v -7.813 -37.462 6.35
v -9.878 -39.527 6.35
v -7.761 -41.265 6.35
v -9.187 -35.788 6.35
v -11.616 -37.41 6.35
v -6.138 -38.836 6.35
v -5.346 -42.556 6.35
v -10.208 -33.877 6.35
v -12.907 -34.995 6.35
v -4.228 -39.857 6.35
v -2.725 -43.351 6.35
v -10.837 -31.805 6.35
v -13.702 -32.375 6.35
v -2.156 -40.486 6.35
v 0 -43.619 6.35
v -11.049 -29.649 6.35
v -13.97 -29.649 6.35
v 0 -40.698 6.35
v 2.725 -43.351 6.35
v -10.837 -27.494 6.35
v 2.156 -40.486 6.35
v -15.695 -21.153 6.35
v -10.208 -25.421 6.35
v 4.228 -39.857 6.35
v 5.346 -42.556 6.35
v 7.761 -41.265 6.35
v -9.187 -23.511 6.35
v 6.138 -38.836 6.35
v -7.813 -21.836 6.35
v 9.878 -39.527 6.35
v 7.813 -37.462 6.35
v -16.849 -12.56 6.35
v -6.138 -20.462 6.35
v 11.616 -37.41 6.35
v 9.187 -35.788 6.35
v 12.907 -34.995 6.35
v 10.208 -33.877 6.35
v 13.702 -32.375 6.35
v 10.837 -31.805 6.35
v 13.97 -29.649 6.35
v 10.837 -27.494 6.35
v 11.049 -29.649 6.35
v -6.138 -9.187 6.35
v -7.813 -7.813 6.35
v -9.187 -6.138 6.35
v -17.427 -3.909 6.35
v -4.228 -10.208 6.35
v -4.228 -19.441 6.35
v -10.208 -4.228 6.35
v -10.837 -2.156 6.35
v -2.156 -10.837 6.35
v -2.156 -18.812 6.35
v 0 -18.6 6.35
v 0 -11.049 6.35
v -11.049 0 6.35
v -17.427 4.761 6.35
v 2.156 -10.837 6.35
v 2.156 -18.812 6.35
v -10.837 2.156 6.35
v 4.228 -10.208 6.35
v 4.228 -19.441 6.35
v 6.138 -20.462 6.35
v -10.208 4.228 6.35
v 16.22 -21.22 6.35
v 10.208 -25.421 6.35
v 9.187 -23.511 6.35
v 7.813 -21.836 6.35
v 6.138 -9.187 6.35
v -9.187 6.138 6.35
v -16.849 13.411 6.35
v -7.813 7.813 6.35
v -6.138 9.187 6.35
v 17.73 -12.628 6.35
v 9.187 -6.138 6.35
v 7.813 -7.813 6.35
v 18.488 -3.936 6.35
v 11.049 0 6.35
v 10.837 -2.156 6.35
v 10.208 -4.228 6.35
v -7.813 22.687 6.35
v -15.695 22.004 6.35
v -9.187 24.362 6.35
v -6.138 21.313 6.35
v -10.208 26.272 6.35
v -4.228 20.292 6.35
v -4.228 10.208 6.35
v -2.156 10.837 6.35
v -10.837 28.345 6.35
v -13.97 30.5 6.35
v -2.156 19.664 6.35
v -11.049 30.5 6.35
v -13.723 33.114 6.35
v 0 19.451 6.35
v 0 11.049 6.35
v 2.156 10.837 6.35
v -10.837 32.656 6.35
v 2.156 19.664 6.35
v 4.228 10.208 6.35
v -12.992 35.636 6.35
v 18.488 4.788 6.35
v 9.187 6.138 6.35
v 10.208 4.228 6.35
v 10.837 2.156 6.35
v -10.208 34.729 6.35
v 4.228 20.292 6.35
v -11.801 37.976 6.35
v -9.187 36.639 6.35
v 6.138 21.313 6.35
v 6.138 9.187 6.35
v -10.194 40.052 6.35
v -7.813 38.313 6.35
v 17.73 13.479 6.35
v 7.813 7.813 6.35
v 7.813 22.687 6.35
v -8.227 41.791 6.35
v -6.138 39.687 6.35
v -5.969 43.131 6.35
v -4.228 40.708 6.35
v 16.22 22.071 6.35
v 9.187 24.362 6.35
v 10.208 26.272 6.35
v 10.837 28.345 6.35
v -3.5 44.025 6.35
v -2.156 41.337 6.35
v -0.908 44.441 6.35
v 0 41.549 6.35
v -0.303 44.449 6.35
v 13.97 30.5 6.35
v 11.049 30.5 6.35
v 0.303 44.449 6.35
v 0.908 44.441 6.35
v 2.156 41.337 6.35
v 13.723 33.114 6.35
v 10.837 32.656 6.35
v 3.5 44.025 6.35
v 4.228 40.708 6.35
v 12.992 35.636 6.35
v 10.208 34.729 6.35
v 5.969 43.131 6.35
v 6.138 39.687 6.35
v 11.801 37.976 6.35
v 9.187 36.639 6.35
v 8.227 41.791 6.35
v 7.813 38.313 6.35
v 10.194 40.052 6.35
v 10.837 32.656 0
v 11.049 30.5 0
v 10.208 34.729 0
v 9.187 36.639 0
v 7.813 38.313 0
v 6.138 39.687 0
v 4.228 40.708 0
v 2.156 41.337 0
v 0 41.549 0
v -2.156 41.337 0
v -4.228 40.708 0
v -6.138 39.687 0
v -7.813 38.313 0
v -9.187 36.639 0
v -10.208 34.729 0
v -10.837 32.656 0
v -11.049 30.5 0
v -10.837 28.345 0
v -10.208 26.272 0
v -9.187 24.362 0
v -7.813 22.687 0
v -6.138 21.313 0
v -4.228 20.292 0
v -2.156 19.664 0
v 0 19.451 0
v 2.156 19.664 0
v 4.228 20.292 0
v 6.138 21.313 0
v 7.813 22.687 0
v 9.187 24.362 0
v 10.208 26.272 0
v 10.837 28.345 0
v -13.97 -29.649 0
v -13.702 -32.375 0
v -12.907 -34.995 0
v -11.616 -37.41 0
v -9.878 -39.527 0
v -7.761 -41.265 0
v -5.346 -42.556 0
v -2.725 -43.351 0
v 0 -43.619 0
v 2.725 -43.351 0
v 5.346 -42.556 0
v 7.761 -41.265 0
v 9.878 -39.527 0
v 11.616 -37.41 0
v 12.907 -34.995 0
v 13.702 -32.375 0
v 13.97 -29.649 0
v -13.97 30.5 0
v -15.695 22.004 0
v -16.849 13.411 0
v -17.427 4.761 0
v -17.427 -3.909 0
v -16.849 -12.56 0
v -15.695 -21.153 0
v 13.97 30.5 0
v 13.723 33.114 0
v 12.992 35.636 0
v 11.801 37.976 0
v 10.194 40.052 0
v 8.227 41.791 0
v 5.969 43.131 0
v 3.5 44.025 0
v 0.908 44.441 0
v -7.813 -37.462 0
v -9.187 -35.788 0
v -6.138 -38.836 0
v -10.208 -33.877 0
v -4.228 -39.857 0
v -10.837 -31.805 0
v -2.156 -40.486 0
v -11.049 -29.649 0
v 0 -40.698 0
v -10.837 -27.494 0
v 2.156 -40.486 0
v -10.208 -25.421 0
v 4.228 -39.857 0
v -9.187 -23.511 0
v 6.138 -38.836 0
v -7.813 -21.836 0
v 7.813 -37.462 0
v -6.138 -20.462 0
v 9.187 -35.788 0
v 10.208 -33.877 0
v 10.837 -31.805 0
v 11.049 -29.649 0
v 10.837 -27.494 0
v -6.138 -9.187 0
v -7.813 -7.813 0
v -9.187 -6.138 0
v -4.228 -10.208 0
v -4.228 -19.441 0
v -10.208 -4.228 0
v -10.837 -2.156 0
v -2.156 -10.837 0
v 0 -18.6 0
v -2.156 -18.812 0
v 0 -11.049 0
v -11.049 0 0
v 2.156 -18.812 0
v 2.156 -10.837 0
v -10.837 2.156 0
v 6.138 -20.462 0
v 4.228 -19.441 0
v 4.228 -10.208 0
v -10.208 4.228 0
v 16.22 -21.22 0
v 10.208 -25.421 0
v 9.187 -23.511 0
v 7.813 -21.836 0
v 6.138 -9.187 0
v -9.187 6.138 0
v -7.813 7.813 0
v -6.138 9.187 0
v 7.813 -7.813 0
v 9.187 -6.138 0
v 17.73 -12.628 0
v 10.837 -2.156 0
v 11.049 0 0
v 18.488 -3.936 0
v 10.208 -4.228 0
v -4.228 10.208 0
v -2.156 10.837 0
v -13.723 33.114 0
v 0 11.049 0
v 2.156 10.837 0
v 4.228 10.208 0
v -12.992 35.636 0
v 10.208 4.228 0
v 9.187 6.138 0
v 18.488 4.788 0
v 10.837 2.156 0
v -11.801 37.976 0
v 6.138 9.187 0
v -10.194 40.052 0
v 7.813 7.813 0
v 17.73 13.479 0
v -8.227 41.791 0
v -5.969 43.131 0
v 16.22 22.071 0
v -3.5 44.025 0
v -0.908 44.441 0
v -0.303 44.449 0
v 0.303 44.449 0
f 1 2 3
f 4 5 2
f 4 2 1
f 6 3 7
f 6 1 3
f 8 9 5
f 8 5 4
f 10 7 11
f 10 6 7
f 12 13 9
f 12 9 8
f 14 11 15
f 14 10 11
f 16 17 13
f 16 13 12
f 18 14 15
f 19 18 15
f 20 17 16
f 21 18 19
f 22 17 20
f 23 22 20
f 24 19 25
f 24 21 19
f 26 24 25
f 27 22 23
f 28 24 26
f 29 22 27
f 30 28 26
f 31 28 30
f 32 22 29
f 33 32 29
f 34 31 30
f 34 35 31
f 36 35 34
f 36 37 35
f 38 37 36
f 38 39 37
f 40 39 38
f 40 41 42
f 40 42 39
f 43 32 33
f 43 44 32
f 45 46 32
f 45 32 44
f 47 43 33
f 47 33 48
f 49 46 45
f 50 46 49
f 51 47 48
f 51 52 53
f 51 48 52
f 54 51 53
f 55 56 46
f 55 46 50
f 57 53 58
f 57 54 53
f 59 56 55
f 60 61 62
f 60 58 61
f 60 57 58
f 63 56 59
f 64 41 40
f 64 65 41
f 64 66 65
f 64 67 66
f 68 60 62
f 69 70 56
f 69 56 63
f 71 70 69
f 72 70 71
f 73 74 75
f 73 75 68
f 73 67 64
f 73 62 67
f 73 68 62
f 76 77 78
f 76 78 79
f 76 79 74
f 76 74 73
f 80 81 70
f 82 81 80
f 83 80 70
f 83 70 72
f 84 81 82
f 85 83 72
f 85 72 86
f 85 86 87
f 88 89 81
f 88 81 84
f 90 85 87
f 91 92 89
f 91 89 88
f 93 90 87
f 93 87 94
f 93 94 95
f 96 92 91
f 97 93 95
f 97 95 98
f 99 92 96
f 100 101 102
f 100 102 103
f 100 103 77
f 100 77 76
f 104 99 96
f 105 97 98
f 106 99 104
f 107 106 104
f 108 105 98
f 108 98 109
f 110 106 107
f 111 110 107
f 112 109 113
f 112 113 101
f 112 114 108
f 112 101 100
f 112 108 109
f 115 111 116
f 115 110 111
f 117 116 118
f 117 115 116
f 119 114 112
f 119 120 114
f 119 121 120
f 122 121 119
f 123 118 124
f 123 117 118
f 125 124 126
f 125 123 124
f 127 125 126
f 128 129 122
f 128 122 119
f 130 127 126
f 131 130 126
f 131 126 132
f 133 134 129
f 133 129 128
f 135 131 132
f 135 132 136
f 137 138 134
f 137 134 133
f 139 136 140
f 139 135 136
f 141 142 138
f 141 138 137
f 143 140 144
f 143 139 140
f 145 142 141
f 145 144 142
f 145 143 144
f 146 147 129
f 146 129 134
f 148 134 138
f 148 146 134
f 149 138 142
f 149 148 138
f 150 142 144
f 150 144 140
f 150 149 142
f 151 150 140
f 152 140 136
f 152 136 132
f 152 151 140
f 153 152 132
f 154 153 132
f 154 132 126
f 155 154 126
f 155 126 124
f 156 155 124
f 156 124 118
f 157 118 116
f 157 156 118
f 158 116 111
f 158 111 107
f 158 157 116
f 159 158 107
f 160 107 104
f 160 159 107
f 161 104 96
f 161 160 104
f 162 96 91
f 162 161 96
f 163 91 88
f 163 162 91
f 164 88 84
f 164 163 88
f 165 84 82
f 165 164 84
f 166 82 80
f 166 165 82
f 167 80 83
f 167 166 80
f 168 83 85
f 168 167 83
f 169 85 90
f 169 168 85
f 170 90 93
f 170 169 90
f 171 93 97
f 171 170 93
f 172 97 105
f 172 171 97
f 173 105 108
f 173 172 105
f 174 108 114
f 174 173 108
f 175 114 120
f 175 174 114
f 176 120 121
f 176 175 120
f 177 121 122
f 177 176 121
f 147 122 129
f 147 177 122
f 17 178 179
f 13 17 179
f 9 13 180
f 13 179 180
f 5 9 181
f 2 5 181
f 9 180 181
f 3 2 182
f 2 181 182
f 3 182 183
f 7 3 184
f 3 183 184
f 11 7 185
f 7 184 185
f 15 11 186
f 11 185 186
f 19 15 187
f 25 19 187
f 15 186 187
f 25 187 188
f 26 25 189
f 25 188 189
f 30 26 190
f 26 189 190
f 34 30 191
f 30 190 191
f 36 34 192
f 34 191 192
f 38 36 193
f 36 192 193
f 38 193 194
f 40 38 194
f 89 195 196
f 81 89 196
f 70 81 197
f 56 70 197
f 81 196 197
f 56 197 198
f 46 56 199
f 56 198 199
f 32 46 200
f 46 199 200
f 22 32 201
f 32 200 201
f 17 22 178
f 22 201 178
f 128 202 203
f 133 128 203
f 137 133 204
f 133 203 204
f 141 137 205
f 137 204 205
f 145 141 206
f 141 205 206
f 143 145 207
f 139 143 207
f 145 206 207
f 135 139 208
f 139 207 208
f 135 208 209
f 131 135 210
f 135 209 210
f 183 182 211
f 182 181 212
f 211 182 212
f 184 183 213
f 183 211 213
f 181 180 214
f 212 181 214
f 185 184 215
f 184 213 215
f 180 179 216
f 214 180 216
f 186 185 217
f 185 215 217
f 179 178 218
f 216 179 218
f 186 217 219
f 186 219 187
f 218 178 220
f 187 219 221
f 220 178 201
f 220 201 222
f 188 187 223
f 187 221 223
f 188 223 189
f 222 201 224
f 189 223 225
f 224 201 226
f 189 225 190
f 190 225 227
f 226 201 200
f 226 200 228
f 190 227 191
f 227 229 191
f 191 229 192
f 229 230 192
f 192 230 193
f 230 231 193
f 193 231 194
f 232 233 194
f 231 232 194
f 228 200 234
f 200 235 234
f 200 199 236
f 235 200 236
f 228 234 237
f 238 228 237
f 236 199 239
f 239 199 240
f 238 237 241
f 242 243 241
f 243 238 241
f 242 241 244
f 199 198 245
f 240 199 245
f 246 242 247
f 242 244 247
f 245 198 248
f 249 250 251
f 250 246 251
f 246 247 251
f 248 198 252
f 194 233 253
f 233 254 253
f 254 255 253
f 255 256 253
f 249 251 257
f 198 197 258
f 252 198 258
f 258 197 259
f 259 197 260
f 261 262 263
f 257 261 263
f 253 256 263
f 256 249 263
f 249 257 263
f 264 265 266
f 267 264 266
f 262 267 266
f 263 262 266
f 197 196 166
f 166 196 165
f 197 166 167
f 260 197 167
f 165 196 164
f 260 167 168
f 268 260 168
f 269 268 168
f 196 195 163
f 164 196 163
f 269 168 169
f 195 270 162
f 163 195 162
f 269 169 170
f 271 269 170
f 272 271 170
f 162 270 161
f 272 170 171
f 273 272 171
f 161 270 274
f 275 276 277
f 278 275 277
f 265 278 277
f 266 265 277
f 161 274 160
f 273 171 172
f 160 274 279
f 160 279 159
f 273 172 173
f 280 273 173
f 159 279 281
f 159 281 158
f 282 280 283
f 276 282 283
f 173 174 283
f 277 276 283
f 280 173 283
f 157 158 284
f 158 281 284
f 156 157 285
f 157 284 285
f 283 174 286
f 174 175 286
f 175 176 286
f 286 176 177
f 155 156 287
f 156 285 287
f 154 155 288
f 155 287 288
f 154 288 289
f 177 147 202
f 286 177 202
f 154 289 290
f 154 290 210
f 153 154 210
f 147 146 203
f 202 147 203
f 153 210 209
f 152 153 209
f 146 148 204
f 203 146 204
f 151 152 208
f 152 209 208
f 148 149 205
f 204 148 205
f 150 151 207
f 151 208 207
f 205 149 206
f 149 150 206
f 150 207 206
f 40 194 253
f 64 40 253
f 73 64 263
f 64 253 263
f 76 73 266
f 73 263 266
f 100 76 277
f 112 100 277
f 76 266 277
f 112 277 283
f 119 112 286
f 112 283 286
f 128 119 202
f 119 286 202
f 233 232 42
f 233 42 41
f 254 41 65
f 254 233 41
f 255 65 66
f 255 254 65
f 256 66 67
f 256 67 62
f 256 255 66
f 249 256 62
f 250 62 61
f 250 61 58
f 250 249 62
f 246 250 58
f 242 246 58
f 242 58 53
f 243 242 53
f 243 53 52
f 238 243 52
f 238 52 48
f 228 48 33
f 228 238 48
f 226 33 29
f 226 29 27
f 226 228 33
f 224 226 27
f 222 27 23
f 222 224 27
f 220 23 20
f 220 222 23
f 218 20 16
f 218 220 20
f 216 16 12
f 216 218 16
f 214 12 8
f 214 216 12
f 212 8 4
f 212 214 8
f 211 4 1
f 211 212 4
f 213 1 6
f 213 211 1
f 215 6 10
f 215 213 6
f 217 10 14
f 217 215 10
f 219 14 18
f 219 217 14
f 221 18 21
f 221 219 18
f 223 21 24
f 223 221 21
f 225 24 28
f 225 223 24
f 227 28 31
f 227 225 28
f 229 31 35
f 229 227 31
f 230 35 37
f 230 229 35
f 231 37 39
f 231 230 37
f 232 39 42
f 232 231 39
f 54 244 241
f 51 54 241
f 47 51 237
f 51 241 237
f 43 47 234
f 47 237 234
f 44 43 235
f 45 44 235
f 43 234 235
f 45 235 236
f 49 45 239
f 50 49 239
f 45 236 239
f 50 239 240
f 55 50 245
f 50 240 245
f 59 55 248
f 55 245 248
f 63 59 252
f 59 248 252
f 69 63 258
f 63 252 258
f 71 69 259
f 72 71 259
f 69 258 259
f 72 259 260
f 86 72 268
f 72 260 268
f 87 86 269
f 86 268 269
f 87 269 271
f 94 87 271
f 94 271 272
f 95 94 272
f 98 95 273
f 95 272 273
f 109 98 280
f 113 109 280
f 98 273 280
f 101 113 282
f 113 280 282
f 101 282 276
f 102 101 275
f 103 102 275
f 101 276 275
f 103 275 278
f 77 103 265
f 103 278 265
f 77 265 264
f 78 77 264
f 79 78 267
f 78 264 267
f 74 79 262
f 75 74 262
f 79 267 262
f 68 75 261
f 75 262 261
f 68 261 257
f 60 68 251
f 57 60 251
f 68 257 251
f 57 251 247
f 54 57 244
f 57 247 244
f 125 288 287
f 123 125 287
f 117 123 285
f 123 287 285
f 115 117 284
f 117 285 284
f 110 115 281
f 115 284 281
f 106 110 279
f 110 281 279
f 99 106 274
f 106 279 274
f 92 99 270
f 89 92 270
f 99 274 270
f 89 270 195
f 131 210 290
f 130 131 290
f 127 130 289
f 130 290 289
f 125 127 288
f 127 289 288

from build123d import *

# Parameters (mm, degrees)
F0_R     = 11.049
F1_DEPTH = 6.35


with BuildPart() as f1:
    # F0 (on Top) → F1 (new body)
    with BuildSketch(Plane.XY):
        with BuildLine():
            ThreePointArc((0, 16.530267), (-9.878282, 20.621985), (-13.97, 30.500267))
            ThreePointArc((-13.97, 30.500267), (-17.499453, 0.425585), (-13.97, -29.649097))
            ThreePointArc((-13.97, -29.649097), (-9.878282, -19.770816), (0, -15.679097))
            Line((0, -15.679097), (0, -13.97))
            ThreePointArc((0, -13.97), (-13.97, 0), (0, 13.97))
            Line((0, 13.97), (0, 16.530267))
        make_face()
        with BuildLine():
            ThreePointArc((13.97, 30.500267), (10.194271, 40.052111), (0.908048, 44.440724))
            ThreePointArc((0.908048, 44.440724), (0, 44.45), (-0.908048, 44.440724))
            ThreePointArc((-0.908048, 44.440724), (-10.194271, 40.052111), (-13.97, 30.500267))
            ThreePointArc((-13.97, 30.500267), (-9.878282, 20.621985), (0, 16.530267))
            ThreePointArc((0, 16.530267), (9.878282, 20.621985), (13.97, 30.500267))
        make_face()
        with Locations((0, 30.500267)):
            Circle(F0_R, mode=Mode.SUBTRACT)
        with BuildLine():
            ThreePointArc((13.97, -29.649097), (18.582887, 0.425585), (13.97, 30.500267))
            ThreePointArc((13.97, 30.500267), (9.878282, 20.621985), (0, 16.530267))
            Line((0, 16.530267), (0, 13.97))
            ThreePointArc((0, 13.97), (9.878282, 9.878282), (13.97, 0))
            ThreePointArc((13.97, 0), (9.878282, -9.878282), (0, -13.97))
            Line((0, -13.97), (0, -15.679097))
            ThreePointArc((0, -15.679097), (9.878282, -19.770816), (13.97, -29.649097))
        make_face()
        with BuildLine():
            Line((0, 11.049), (0, 13.97))
            ThreePointArc((0, 13.97), (-13.97, 0), (0, -13.97))
            Line((0, -13.97), (0, -11.049))
            ThreePointArc((0, -11.049), (-11.049, 0), (0, 11.049))
        make_face()
        with BuildLine():
            ThreePointArc((13.97, 0), (9.878282, 9.878282), (0, 13.97))
            Line((0, 13.97), (0, 11.049))
            ThreePointArc((0, 11.049), (7.812823, 7.812823), (11.049, 0))
            ThreePointArc((11.049, 0), (7.812823, -7.812823), (0, -11.049))
            Line((0, -11.049), (0, -13.97))
            ThreePointArc((0, -13.97), (9.878282, -9.878282), (13.97, 0))
        make_face()
        with BuildLine():
            ThreePointArc((-13.97, -29.649097), (0, -43.619097), (13.97, -29.649097))
            ThreePointArc((13.97, -29.649097), (9.878282, -19.770816), (0, -15.679097))
            ThreePointArc((0, -15.679097), (-9.878282, -19.770816), (-13.97, -29.649097))
        make_face()
        with Locations((0, -29.649097)):
            Circle(F0_R, mode=Mode.SUBTRACT)
    extrude(amount=F1_DEPTH)


solid = f1.part
